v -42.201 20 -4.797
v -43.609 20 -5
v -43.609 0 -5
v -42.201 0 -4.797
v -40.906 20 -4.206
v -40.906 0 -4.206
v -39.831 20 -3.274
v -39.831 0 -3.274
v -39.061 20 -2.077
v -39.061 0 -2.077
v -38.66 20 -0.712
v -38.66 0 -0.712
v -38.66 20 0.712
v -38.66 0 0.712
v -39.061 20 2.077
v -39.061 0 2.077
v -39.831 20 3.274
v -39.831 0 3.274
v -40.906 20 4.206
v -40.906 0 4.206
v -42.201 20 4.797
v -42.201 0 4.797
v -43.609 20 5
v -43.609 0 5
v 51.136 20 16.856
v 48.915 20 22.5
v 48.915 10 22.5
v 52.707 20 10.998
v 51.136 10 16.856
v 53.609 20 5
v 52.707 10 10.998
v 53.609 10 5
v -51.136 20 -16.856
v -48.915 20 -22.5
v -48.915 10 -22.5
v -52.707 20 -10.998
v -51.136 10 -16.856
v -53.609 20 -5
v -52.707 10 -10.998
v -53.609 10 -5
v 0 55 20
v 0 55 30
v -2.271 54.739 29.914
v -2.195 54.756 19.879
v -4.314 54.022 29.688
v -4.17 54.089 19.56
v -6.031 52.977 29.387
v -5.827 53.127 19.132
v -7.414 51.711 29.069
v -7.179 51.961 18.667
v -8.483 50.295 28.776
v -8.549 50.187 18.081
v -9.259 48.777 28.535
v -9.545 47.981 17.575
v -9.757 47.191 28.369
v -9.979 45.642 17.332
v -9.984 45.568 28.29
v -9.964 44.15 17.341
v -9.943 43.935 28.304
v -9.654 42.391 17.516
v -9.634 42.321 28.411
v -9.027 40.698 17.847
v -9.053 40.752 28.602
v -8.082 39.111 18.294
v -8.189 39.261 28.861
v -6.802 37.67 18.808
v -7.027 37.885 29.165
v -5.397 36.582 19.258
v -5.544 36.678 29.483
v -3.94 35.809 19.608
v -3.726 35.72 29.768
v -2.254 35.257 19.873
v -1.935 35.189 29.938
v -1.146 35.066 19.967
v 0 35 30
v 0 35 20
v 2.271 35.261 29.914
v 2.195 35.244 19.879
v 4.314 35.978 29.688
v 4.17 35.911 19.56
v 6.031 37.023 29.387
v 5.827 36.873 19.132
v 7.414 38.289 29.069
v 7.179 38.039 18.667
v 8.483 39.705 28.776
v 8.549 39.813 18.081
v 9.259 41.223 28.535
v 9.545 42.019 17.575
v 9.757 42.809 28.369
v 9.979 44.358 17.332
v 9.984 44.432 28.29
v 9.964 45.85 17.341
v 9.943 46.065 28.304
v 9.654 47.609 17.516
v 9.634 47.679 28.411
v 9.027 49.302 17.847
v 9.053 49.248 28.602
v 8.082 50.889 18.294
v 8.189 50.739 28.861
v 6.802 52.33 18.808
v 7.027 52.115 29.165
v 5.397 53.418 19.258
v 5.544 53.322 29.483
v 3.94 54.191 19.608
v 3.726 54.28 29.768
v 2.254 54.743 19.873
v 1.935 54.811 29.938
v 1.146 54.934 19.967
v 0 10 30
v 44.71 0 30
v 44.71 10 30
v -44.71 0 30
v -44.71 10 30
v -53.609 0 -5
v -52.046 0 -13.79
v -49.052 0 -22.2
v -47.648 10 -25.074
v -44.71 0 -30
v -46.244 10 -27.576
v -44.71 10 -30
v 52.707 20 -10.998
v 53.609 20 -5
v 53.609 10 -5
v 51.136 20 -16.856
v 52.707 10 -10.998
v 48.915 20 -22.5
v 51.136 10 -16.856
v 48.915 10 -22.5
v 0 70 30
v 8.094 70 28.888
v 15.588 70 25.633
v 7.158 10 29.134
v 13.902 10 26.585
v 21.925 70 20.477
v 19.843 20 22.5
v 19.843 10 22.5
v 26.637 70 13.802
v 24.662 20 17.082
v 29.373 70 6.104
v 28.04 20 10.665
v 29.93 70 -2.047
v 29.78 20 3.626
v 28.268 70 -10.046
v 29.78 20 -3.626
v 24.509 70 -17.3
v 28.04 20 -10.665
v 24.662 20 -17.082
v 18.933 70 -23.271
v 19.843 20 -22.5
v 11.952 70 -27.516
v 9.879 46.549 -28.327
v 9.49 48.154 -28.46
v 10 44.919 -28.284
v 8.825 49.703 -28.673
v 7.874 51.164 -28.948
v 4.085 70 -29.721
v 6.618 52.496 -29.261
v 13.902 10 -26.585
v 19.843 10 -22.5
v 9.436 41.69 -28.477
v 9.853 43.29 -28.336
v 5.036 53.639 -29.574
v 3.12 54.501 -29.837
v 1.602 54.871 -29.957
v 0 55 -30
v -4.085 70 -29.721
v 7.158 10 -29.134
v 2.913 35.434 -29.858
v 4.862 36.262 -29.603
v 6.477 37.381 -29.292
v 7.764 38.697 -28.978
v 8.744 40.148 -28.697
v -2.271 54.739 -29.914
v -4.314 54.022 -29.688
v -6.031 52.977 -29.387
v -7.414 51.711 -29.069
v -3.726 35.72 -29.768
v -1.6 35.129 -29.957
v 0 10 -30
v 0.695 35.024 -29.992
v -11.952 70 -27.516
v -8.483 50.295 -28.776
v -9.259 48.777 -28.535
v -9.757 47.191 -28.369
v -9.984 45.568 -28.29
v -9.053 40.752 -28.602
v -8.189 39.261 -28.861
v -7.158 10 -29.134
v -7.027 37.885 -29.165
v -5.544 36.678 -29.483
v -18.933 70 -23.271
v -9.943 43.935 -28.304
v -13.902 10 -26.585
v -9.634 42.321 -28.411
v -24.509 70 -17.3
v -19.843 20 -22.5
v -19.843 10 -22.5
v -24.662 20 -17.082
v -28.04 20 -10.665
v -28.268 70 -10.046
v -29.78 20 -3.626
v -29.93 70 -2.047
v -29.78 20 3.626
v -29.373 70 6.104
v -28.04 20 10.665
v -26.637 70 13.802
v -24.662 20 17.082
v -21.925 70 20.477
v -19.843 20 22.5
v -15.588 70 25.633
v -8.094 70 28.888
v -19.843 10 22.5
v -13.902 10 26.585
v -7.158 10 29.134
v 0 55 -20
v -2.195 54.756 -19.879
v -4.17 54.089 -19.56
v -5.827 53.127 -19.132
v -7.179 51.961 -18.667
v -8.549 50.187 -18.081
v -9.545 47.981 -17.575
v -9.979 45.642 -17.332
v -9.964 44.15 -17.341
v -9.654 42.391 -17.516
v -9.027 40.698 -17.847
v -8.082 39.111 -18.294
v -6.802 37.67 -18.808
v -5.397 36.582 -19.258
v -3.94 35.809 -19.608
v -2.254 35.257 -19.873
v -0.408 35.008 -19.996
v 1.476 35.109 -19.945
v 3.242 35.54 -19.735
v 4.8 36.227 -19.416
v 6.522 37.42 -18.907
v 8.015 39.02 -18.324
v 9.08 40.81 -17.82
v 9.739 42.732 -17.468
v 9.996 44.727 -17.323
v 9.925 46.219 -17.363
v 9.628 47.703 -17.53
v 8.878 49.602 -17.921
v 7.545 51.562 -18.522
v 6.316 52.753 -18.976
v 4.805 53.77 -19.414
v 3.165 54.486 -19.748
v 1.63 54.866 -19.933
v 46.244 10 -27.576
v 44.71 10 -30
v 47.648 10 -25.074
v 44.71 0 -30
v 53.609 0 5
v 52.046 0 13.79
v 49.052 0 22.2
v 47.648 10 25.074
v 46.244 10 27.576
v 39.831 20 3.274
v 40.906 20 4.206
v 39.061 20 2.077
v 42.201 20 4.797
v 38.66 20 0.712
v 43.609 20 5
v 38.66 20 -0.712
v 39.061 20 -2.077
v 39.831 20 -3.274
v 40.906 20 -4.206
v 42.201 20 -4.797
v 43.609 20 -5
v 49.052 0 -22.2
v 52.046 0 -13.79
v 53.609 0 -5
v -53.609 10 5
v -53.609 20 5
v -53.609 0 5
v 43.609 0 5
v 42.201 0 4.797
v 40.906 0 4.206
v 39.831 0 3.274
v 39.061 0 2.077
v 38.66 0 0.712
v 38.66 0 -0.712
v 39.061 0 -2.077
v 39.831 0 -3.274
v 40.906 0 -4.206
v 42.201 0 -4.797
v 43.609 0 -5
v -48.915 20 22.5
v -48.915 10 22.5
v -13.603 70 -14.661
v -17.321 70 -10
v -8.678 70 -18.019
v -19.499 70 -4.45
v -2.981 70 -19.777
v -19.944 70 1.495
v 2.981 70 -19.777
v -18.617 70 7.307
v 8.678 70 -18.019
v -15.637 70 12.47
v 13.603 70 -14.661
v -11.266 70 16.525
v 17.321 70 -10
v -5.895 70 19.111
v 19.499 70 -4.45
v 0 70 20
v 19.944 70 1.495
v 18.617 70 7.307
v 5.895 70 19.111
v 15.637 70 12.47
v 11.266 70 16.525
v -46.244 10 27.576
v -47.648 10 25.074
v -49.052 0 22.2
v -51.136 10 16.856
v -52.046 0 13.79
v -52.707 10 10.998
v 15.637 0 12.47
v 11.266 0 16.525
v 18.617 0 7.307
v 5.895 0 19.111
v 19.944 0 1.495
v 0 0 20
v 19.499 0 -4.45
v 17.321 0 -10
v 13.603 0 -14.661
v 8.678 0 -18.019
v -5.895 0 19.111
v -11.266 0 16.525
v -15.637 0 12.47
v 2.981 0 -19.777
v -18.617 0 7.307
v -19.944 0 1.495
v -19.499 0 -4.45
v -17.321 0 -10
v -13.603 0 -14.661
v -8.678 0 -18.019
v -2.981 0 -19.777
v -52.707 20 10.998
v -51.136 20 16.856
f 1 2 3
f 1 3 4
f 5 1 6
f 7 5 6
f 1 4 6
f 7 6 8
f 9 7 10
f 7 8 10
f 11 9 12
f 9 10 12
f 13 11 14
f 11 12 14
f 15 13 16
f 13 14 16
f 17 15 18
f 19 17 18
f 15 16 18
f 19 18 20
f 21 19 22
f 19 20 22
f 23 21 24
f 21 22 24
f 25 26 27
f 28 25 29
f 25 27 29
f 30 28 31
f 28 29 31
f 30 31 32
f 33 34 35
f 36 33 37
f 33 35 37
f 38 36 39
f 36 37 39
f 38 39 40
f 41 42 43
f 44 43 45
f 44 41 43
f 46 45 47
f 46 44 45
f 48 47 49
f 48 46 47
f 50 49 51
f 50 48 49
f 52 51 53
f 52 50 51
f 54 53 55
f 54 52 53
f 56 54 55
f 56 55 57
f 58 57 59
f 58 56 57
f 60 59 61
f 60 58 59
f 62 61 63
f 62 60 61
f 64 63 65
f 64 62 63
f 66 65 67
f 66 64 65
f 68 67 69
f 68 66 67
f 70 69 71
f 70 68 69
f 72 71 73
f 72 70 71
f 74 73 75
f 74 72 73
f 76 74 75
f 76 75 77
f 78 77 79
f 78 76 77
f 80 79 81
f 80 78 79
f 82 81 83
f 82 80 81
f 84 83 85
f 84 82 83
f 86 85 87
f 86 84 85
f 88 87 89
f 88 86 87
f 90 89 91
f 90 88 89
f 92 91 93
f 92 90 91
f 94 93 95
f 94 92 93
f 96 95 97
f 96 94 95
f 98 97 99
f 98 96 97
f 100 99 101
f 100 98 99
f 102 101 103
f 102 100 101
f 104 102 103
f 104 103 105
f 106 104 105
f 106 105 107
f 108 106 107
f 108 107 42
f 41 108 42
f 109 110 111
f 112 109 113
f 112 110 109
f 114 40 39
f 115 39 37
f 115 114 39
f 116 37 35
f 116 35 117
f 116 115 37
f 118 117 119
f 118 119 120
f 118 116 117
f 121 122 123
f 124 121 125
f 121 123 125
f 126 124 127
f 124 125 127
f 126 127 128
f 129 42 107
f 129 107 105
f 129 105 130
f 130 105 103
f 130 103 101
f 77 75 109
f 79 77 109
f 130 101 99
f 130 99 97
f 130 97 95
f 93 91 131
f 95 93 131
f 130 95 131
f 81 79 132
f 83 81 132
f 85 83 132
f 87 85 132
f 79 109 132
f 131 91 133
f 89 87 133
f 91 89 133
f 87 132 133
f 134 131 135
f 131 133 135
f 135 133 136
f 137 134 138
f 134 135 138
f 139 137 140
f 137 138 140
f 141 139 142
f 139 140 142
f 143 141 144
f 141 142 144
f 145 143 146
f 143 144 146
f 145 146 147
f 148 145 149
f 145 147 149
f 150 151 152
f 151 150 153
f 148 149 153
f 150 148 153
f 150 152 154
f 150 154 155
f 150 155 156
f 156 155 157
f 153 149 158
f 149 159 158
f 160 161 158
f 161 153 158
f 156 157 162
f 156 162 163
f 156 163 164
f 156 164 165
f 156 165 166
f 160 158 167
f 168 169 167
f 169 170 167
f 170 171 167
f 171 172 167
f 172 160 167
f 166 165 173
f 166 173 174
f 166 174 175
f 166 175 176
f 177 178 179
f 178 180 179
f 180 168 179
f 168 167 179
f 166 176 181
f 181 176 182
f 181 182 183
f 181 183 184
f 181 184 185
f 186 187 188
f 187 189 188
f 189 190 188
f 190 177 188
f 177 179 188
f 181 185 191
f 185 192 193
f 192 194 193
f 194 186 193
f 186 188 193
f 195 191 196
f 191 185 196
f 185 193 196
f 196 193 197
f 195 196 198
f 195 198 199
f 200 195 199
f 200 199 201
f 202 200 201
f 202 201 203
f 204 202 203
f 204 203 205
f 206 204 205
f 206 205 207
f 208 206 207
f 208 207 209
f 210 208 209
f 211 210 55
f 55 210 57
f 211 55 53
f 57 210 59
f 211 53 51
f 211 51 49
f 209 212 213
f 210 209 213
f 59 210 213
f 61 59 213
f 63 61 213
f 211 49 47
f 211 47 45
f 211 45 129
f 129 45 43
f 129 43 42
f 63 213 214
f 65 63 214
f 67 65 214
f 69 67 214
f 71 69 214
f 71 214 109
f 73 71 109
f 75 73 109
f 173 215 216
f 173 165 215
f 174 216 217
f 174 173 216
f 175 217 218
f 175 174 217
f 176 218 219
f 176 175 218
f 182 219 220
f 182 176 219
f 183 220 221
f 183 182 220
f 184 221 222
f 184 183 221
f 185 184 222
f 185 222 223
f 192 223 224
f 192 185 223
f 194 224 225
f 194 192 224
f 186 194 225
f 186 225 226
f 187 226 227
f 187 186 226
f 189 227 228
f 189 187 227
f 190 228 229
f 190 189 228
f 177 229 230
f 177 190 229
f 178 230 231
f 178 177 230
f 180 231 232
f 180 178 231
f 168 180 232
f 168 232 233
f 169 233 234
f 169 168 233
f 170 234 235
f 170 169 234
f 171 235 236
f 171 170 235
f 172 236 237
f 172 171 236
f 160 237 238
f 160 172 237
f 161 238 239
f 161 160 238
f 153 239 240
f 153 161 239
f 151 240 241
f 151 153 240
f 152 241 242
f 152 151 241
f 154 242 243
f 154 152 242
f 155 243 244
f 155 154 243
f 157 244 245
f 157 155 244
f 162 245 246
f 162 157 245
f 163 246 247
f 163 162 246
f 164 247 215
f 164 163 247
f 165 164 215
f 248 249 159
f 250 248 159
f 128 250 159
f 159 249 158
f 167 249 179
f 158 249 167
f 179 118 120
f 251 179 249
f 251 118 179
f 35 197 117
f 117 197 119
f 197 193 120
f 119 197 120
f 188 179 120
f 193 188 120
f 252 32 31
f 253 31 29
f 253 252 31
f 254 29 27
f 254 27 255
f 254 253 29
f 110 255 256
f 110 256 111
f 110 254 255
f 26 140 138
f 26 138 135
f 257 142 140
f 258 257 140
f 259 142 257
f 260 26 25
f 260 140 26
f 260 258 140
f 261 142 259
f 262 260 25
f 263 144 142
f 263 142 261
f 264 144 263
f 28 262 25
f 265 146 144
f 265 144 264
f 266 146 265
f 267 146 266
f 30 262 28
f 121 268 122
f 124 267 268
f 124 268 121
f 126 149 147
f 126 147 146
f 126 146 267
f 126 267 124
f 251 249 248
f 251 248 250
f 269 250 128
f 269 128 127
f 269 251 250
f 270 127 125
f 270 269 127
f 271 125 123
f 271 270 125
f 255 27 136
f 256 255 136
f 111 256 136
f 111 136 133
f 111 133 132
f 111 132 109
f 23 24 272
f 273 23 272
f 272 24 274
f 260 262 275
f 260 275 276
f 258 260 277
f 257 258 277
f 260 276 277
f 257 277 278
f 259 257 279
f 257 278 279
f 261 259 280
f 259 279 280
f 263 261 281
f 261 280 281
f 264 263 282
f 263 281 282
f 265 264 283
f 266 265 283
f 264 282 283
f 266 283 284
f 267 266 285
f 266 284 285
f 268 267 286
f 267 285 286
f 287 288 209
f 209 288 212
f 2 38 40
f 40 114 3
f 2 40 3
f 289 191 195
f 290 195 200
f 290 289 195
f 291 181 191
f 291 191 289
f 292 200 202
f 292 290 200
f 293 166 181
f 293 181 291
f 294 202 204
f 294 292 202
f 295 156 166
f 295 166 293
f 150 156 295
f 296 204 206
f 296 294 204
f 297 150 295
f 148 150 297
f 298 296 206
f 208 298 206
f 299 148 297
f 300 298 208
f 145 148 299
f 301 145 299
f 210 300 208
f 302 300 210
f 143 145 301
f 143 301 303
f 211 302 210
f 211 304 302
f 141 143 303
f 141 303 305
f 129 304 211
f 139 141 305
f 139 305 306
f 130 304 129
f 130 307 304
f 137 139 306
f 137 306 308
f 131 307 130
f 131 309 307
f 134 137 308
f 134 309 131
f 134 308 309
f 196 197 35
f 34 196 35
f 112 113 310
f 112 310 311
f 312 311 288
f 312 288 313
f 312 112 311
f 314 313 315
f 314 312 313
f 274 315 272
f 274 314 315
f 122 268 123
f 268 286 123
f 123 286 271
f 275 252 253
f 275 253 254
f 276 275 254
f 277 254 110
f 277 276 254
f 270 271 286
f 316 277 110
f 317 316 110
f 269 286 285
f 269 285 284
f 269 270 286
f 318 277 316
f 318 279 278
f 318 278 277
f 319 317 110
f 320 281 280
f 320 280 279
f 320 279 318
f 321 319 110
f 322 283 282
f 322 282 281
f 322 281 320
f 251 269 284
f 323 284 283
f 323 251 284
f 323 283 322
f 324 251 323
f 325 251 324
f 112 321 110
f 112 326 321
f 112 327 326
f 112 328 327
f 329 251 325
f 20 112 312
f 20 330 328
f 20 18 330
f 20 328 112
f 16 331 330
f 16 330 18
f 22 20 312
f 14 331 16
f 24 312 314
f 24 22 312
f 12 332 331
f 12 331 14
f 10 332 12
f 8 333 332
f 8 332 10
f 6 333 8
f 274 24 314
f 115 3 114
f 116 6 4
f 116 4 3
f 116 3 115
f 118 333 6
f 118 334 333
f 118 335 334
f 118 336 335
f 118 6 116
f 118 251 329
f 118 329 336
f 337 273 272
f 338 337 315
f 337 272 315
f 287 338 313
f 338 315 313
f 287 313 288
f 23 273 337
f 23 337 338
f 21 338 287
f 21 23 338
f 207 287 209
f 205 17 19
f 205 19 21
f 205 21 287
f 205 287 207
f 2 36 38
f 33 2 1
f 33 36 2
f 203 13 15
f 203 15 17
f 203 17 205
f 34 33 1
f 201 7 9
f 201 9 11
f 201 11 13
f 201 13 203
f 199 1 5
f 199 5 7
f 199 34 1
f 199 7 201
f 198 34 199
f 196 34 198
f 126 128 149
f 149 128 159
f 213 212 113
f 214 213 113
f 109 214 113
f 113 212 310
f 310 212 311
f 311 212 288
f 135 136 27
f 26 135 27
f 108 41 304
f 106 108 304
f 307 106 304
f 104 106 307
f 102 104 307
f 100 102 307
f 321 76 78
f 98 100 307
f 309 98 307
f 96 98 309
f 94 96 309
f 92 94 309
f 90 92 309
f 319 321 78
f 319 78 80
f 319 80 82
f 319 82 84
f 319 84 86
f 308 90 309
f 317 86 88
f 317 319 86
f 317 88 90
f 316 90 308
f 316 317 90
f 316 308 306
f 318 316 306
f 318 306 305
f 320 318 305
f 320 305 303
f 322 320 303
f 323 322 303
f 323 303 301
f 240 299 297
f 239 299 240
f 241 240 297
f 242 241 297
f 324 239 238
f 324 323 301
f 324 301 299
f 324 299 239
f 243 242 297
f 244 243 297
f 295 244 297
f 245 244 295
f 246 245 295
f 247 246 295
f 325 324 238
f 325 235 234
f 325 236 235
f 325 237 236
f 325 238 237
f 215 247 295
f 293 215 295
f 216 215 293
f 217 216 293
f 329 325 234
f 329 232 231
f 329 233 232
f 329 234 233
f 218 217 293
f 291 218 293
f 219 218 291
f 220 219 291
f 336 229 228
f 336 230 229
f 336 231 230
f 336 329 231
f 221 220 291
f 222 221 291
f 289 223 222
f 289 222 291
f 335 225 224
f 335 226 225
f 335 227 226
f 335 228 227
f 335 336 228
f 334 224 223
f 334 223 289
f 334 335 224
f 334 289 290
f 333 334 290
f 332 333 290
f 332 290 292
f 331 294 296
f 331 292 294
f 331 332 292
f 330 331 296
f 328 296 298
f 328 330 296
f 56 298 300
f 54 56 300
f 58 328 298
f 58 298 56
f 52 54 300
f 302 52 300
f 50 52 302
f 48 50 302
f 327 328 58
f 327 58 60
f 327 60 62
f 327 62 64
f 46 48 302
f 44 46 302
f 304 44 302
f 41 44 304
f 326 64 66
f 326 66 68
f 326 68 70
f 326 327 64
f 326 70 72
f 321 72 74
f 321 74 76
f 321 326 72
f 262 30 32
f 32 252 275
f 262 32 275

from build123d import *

# Parameters (mm, degrees)
EXTRUDE_1_DEPTH          = 10
SKETCH_3_R               = 30
EXTRUDE_2_DEPTH          = 60
CUT_EXTRUDE_1_DEPTH      = 94.134165345
CUT_EXTRUDE_1_DEPTH_BACK = 94.134165345
SKETCH_4_R               = 10
EXTRUDE_3_DEPTH          = 10
CUT_EXTRUDE_2_DEPTH      = 94.134165377
CUT_EXTRUDE_2_DEPTH_BACK = 94.134165377
SKETCH_8_R               = 20


with BuildPart() as part:
    # 草图2 → 凸台-拉伸1 (new body)
    with BuildSketch(Plane(origin=(0, 0, 0), x_dir=(1, 0, 0), z_dir=(0, 1, 0))):
        with BuildLine():
            Line((53.609446504, 5), (43.609446504, 5))
            ThreePointArc((43.609446504, 5), (38.609446504, 0), (43.609446504, -5))
            Line((43.609446504, -5), (53.609446504, -5))
            ThreePointArc((53.609446504, -5), (50.723980057, -18.056871313), (44.709873121, -30))
            Line((44.709873121, -30), (-44.709873121, -30))
            ThreePointArc((-44.709873121, -30), (-50.723980057, -18.056871313), (-53.609446504, -5))
            Line((-53.609446504, -5), (-43.609446504, -5))
            ThreePointArc((-43.609446504, -5), (-38.609446504, 0), (-43.609446504, 5))
            Line((-43.609446504, 5), (-53.609446504, 5))
            ThreePointArc((-53.609446504, 5), (-50.723980057, 18.056871313), (-44.709873121, 30))
            Line((-44.709873121, 30), (44.709873121, 30))
            ThreePointArc((44.709873121, 30), (50.723980057, 18.056871313), (53.609446504, 5))
        make_face()
    extrude(amount=EXTRUDE_1_DEPTH)

    # 草图3 → 凸台-拉伸2 (add)
    with BuildSketch(Plane(origin=(0, 10, 0), x_dir=(1, 0, 0), z_dir=(0, 1, 0))):
        with Locations(Location((0, 0, 0), (0, 0, 270))):
            Circle(SKETCH_3_R)
    extrude(amount=EXTRUDE_2_DEPTH)

    # 草图4 → 切除-拉伸1 (cut, two sides: drawn at the far end of the back side and taken through both)
    with BuildSketch(Plane.XY.offset(-CUT_EXTRUDE_1_DEPTH_BACK)):
        with Locations(Location((0, 45, 0), (0, 0, 90))):
            Circle(SKETCH_4_R)
    extrude(amount=CUT_EXTRUDE_1_DEPTH + CUT_EXTRUDE_1_DEPTH_BACK, mode=Mode.SUBTRACT)

    # 草图7 → 凸台-拉伸3 (add)
    with BuildSketch(Plane(origin=(0, 10, 0), x_dir=(1, 0, 0), z_dir=(0, 1, 0))):
        with BuildLine():
            Line((-48.915465391, -22.5), (-19.843134833, -22.5))
            ThreePointArc((-19.843134833, -22.5), (-30, 0), (-19.843134833, 22.5))
            Line((-19.843134833, 22.5), (-48.915465391, 22.5))
            ThreePointArc((-48.915465391, 22.5), (-52.003864181, 13.948866071), (-53.609446504, 5))
            Line((-53.609446504, 5), (-43.609446504, 5))
            ThreePointArc((-43.609446504, 5), (-38.609446504, 0), (-43.609446504, -5))
            Line((-43.609446504, -5), (-53.609446504, -5))
            ThreePointArc((-53.609446504, -5), (-52.003864181, -13.948866071), (-48.915465391, -22.5))
        make_face()
        with BuildLine():
            Line((19.843134833, -22.5), (48.915465391, -22.5))
            ThreePointArc((48.915465391, -22.5), (52.003864181, -13.948866071), (53.609446504, -5))
            Line((53.609446504, -5), (43.609446504, -5))
            ThreePointArc((43.609446504, -5), (38.609446504, 0), (43.609446504, 5))
            Line((43.609446504, 5), (53.609446504, 5))
            ThreePointArc((53.609446504, 5), (52.003864181, 13.948866071), (48.915465391, 22.5))
            Line((48.915465391, 22.5), (19.843134833, 22.5))
            ThreePointArc((19.843134833, 22.5), (30, 0), (19.843134833, -22.5))
        make_face()
    extrude(amount=EXTRUDE_3_DEPTH)

    # 草图8 → 切除-拉伸2 (cut, two sides: drawn at the far end of the back side and taken through both)
    with BuildSketch(Plane(origin=(0, 70, 0), x_dir=(1, 0, 0), z_dir=(0, 1, 0)).offset(-CUT_EXTRUDE_2_DEPTH_BACK)):
        with Locations(Location((0, 0, 0), (0, 0, 270))):
            Circle(SKETCH_8_R)
    extrude(amount=CUT_EXTRUDE_2_DEPTH + CUT_EXTRUDE_2_DEPTH_BACK, mode=Mode.SUBTRACT)


solid = part.part
